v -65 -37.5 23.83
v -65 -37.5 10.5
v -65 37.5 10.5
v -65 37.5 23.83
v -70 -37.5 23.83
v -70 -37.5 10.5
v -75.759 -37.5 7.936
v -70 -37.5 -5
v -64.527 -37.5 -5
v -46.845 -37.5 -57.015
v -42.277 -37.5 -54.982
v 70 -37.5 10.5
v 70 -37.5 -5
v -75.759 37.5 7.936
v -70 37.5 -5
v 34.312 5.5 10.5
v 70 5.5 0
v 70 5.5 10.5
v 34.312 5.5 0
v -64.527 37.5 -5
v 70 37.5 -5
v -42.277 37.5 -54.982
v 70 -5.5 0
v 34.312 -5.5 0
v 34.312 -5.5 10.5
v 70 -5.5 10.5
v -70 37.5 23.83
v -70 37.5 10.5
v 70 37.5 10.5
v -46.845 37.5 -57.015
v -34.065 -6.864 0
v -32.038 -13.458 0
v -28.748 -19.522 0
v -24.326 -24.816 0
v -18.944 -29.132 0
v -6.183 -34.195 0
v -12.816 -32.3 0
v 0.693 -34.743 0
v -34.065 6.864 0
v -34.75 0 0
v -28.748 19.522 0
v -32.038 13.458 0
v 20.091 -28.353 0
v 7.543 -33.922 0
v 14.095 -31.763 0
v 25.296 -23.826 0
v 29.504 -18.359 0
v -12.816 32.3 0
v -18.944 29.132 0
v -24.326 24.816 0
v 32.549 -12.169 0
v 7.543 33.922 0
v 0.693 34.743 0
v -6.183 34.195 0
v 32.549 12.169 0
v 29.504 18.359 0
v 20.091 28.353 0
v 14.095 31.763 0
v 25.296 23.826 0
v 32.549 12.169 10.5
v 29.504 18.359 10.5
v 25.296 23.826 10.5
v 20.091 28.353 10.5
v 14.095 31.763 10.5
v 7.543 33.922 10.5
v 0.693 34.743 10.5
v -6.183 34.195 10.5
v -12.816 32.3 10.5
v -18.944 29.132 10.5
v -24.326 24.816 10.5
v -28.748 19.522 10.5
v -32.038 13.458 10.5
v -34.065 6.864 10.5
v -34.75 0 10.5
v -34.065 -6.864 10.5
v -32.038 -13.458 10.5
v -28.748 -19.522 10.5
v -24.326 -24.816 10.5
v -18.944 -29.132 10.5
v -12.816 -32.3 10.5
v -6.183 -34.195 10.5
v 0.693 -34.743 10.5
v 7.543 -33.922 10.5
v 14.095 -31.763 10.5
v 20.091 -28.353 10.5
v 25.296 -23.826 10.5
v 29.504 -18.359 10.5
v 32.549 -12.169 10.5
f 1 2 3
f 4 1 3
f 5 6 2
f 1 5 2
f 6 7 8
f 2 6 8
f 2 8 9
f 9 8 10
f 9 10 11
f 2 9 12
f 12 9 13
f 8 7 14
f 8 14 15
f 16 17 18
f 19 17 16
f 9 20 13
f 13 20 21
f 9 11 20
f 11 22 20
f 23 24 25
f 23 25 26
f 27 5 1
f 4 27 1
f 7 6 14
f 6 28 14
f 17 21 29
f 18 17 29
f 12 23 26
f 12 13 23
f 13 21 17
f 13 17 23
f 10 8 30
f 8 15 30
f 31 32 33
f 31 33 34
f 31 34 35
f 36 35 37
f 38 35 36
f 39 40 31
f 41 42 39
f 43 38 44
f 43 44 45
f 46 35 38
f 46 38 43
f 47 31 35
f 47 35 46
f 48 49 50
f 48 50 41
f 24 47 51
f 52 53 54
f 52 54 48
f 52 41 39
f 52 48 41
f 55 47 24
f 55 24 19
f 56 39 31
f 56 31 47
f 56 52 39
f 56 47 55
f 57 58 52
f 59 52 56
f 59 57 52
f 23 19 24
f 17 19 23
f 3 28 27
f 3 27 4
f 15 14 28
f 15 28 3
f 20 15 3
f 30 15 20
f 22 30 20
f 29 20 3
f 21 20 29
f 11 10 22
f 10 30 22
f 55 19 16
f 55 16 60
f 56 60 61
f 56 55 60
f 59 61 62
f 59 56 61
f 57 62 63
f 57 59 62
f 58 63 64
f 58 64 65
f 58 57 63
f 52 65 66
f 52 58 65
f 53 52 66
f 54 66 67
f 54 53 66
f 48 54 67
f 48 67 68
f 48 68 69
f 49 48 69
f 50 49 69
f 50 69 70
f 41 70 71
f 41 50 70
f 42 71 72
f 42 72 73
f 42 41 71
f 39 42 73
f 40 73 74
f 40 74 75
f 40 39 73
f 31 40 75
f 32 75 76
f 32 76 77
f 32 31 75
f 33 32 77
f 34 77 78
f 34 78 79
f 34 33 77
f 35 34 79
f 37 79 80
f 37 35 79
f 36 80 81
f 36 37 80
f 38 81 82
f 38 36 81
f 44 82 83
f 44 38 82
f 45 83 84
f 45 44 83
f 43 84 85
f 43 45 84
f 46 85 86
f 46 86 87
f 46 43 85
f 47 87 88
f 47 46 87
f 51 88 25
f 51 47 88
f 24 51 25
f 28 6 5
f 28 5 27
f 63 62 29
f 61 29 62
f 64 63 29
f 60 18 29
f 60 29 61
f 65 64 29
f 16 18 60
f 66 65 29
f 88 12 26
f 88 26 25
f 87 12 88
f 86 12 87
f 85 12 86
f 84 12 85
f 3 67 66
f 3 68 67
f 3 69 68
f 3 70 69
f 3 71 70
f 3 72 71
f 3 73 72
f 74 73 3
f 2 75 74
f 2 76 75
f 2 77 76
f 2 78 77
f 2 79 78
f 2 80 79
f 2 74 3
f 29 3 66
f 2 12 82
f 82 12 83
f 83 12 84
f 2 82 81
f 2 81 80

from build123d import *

# Parameters (mm, degrees)
F1_DEPTH      = 10.5
F2_W          = 140
F2_H          = 75
F3_DEPTH      = 5
F5_DEPTH      = 37.5
F5_DEPTH_BACK = 37.5
F6_DEPTH      = 10.5
F7_W          = 5
F7_H          = 75
F8_DEPTH      = 13.33


with BuildPart() as f1:
    # F0 (on Top) → F1 (new body)
    with BuildSketch(Plane.XY):
        with BuildLine():
            Line((-70, -37.5), (70, -37.5))
            Line((70, -37.5), (70, -5.5))
            Line((70, -5.5), (34.311988, -5.5))
            ThreePointArc((34.311988, -5.5), (-34.75, 0), (34.311988, 5.5))
            Line((34.311988, 5.5), (70, 5.5))
            Line((70, 5.5), (70, 37.5))
            Line((70, 37.5), (-70, 37.5))
            Line((-70, 37.5), (-70, -37.5))
        make_face()
    extrude(amount=F1_DEPTH)

    # F2 (on Top) → F3 (join)
    with BuildSketch(Plane.XY):
        Rectangle(F2_W, F2_H)
    extrude(amount=-F3_DEPTH)

    # F4 (on Front) → F5 (join, two sides)
    with BuildSketch(Plane.XZ) as f5_sk:
        Polygon((70, 10.5), (-70, 10.5), (-70, -5), (-65.432164, -2.96656), (-64.526948, -5), (70, -5), align=None)
        Polygon((-70, -5), (-70, 10.5), (-75.75882, 7.936376), align=None)
        Polygon((-64.526948, -5), (-70, -5), (-46.844684, -57.015147), (-42.276849, -54.981707), align=None)
    extrude(amount=F5_DEPTH)
    extrude(f5_sk.sketch, amount=-F5_DEPTH_BACK)

    # F0 (on Top) → F6 (cut, through all)
    with BuildSketch(Plane.XY):
        with BuildLine():
            Line((34.311988, -5.5), (70, -5.5))
            Line((70, -5.5), (70, 5.5))
            Line((70, 5.5), (34.311988, 5.5))
            ThreePointArc((34.311988, 5.5), (-34.75, 0), (34.311988, -5.5))
        make_face()
    extrude(amount=F6_DEPTH, mode=Mode.SUBTRACT)

    # F7 (on face) → F8 (join)
    with BuildSketch(Plane.XY.offset(10.5)):
        with Locations((-67.5, 0)):
            Rectangle(F7_W, F7_H)
    extrude(amount=F8_DEPTH)


solid = f1.part
